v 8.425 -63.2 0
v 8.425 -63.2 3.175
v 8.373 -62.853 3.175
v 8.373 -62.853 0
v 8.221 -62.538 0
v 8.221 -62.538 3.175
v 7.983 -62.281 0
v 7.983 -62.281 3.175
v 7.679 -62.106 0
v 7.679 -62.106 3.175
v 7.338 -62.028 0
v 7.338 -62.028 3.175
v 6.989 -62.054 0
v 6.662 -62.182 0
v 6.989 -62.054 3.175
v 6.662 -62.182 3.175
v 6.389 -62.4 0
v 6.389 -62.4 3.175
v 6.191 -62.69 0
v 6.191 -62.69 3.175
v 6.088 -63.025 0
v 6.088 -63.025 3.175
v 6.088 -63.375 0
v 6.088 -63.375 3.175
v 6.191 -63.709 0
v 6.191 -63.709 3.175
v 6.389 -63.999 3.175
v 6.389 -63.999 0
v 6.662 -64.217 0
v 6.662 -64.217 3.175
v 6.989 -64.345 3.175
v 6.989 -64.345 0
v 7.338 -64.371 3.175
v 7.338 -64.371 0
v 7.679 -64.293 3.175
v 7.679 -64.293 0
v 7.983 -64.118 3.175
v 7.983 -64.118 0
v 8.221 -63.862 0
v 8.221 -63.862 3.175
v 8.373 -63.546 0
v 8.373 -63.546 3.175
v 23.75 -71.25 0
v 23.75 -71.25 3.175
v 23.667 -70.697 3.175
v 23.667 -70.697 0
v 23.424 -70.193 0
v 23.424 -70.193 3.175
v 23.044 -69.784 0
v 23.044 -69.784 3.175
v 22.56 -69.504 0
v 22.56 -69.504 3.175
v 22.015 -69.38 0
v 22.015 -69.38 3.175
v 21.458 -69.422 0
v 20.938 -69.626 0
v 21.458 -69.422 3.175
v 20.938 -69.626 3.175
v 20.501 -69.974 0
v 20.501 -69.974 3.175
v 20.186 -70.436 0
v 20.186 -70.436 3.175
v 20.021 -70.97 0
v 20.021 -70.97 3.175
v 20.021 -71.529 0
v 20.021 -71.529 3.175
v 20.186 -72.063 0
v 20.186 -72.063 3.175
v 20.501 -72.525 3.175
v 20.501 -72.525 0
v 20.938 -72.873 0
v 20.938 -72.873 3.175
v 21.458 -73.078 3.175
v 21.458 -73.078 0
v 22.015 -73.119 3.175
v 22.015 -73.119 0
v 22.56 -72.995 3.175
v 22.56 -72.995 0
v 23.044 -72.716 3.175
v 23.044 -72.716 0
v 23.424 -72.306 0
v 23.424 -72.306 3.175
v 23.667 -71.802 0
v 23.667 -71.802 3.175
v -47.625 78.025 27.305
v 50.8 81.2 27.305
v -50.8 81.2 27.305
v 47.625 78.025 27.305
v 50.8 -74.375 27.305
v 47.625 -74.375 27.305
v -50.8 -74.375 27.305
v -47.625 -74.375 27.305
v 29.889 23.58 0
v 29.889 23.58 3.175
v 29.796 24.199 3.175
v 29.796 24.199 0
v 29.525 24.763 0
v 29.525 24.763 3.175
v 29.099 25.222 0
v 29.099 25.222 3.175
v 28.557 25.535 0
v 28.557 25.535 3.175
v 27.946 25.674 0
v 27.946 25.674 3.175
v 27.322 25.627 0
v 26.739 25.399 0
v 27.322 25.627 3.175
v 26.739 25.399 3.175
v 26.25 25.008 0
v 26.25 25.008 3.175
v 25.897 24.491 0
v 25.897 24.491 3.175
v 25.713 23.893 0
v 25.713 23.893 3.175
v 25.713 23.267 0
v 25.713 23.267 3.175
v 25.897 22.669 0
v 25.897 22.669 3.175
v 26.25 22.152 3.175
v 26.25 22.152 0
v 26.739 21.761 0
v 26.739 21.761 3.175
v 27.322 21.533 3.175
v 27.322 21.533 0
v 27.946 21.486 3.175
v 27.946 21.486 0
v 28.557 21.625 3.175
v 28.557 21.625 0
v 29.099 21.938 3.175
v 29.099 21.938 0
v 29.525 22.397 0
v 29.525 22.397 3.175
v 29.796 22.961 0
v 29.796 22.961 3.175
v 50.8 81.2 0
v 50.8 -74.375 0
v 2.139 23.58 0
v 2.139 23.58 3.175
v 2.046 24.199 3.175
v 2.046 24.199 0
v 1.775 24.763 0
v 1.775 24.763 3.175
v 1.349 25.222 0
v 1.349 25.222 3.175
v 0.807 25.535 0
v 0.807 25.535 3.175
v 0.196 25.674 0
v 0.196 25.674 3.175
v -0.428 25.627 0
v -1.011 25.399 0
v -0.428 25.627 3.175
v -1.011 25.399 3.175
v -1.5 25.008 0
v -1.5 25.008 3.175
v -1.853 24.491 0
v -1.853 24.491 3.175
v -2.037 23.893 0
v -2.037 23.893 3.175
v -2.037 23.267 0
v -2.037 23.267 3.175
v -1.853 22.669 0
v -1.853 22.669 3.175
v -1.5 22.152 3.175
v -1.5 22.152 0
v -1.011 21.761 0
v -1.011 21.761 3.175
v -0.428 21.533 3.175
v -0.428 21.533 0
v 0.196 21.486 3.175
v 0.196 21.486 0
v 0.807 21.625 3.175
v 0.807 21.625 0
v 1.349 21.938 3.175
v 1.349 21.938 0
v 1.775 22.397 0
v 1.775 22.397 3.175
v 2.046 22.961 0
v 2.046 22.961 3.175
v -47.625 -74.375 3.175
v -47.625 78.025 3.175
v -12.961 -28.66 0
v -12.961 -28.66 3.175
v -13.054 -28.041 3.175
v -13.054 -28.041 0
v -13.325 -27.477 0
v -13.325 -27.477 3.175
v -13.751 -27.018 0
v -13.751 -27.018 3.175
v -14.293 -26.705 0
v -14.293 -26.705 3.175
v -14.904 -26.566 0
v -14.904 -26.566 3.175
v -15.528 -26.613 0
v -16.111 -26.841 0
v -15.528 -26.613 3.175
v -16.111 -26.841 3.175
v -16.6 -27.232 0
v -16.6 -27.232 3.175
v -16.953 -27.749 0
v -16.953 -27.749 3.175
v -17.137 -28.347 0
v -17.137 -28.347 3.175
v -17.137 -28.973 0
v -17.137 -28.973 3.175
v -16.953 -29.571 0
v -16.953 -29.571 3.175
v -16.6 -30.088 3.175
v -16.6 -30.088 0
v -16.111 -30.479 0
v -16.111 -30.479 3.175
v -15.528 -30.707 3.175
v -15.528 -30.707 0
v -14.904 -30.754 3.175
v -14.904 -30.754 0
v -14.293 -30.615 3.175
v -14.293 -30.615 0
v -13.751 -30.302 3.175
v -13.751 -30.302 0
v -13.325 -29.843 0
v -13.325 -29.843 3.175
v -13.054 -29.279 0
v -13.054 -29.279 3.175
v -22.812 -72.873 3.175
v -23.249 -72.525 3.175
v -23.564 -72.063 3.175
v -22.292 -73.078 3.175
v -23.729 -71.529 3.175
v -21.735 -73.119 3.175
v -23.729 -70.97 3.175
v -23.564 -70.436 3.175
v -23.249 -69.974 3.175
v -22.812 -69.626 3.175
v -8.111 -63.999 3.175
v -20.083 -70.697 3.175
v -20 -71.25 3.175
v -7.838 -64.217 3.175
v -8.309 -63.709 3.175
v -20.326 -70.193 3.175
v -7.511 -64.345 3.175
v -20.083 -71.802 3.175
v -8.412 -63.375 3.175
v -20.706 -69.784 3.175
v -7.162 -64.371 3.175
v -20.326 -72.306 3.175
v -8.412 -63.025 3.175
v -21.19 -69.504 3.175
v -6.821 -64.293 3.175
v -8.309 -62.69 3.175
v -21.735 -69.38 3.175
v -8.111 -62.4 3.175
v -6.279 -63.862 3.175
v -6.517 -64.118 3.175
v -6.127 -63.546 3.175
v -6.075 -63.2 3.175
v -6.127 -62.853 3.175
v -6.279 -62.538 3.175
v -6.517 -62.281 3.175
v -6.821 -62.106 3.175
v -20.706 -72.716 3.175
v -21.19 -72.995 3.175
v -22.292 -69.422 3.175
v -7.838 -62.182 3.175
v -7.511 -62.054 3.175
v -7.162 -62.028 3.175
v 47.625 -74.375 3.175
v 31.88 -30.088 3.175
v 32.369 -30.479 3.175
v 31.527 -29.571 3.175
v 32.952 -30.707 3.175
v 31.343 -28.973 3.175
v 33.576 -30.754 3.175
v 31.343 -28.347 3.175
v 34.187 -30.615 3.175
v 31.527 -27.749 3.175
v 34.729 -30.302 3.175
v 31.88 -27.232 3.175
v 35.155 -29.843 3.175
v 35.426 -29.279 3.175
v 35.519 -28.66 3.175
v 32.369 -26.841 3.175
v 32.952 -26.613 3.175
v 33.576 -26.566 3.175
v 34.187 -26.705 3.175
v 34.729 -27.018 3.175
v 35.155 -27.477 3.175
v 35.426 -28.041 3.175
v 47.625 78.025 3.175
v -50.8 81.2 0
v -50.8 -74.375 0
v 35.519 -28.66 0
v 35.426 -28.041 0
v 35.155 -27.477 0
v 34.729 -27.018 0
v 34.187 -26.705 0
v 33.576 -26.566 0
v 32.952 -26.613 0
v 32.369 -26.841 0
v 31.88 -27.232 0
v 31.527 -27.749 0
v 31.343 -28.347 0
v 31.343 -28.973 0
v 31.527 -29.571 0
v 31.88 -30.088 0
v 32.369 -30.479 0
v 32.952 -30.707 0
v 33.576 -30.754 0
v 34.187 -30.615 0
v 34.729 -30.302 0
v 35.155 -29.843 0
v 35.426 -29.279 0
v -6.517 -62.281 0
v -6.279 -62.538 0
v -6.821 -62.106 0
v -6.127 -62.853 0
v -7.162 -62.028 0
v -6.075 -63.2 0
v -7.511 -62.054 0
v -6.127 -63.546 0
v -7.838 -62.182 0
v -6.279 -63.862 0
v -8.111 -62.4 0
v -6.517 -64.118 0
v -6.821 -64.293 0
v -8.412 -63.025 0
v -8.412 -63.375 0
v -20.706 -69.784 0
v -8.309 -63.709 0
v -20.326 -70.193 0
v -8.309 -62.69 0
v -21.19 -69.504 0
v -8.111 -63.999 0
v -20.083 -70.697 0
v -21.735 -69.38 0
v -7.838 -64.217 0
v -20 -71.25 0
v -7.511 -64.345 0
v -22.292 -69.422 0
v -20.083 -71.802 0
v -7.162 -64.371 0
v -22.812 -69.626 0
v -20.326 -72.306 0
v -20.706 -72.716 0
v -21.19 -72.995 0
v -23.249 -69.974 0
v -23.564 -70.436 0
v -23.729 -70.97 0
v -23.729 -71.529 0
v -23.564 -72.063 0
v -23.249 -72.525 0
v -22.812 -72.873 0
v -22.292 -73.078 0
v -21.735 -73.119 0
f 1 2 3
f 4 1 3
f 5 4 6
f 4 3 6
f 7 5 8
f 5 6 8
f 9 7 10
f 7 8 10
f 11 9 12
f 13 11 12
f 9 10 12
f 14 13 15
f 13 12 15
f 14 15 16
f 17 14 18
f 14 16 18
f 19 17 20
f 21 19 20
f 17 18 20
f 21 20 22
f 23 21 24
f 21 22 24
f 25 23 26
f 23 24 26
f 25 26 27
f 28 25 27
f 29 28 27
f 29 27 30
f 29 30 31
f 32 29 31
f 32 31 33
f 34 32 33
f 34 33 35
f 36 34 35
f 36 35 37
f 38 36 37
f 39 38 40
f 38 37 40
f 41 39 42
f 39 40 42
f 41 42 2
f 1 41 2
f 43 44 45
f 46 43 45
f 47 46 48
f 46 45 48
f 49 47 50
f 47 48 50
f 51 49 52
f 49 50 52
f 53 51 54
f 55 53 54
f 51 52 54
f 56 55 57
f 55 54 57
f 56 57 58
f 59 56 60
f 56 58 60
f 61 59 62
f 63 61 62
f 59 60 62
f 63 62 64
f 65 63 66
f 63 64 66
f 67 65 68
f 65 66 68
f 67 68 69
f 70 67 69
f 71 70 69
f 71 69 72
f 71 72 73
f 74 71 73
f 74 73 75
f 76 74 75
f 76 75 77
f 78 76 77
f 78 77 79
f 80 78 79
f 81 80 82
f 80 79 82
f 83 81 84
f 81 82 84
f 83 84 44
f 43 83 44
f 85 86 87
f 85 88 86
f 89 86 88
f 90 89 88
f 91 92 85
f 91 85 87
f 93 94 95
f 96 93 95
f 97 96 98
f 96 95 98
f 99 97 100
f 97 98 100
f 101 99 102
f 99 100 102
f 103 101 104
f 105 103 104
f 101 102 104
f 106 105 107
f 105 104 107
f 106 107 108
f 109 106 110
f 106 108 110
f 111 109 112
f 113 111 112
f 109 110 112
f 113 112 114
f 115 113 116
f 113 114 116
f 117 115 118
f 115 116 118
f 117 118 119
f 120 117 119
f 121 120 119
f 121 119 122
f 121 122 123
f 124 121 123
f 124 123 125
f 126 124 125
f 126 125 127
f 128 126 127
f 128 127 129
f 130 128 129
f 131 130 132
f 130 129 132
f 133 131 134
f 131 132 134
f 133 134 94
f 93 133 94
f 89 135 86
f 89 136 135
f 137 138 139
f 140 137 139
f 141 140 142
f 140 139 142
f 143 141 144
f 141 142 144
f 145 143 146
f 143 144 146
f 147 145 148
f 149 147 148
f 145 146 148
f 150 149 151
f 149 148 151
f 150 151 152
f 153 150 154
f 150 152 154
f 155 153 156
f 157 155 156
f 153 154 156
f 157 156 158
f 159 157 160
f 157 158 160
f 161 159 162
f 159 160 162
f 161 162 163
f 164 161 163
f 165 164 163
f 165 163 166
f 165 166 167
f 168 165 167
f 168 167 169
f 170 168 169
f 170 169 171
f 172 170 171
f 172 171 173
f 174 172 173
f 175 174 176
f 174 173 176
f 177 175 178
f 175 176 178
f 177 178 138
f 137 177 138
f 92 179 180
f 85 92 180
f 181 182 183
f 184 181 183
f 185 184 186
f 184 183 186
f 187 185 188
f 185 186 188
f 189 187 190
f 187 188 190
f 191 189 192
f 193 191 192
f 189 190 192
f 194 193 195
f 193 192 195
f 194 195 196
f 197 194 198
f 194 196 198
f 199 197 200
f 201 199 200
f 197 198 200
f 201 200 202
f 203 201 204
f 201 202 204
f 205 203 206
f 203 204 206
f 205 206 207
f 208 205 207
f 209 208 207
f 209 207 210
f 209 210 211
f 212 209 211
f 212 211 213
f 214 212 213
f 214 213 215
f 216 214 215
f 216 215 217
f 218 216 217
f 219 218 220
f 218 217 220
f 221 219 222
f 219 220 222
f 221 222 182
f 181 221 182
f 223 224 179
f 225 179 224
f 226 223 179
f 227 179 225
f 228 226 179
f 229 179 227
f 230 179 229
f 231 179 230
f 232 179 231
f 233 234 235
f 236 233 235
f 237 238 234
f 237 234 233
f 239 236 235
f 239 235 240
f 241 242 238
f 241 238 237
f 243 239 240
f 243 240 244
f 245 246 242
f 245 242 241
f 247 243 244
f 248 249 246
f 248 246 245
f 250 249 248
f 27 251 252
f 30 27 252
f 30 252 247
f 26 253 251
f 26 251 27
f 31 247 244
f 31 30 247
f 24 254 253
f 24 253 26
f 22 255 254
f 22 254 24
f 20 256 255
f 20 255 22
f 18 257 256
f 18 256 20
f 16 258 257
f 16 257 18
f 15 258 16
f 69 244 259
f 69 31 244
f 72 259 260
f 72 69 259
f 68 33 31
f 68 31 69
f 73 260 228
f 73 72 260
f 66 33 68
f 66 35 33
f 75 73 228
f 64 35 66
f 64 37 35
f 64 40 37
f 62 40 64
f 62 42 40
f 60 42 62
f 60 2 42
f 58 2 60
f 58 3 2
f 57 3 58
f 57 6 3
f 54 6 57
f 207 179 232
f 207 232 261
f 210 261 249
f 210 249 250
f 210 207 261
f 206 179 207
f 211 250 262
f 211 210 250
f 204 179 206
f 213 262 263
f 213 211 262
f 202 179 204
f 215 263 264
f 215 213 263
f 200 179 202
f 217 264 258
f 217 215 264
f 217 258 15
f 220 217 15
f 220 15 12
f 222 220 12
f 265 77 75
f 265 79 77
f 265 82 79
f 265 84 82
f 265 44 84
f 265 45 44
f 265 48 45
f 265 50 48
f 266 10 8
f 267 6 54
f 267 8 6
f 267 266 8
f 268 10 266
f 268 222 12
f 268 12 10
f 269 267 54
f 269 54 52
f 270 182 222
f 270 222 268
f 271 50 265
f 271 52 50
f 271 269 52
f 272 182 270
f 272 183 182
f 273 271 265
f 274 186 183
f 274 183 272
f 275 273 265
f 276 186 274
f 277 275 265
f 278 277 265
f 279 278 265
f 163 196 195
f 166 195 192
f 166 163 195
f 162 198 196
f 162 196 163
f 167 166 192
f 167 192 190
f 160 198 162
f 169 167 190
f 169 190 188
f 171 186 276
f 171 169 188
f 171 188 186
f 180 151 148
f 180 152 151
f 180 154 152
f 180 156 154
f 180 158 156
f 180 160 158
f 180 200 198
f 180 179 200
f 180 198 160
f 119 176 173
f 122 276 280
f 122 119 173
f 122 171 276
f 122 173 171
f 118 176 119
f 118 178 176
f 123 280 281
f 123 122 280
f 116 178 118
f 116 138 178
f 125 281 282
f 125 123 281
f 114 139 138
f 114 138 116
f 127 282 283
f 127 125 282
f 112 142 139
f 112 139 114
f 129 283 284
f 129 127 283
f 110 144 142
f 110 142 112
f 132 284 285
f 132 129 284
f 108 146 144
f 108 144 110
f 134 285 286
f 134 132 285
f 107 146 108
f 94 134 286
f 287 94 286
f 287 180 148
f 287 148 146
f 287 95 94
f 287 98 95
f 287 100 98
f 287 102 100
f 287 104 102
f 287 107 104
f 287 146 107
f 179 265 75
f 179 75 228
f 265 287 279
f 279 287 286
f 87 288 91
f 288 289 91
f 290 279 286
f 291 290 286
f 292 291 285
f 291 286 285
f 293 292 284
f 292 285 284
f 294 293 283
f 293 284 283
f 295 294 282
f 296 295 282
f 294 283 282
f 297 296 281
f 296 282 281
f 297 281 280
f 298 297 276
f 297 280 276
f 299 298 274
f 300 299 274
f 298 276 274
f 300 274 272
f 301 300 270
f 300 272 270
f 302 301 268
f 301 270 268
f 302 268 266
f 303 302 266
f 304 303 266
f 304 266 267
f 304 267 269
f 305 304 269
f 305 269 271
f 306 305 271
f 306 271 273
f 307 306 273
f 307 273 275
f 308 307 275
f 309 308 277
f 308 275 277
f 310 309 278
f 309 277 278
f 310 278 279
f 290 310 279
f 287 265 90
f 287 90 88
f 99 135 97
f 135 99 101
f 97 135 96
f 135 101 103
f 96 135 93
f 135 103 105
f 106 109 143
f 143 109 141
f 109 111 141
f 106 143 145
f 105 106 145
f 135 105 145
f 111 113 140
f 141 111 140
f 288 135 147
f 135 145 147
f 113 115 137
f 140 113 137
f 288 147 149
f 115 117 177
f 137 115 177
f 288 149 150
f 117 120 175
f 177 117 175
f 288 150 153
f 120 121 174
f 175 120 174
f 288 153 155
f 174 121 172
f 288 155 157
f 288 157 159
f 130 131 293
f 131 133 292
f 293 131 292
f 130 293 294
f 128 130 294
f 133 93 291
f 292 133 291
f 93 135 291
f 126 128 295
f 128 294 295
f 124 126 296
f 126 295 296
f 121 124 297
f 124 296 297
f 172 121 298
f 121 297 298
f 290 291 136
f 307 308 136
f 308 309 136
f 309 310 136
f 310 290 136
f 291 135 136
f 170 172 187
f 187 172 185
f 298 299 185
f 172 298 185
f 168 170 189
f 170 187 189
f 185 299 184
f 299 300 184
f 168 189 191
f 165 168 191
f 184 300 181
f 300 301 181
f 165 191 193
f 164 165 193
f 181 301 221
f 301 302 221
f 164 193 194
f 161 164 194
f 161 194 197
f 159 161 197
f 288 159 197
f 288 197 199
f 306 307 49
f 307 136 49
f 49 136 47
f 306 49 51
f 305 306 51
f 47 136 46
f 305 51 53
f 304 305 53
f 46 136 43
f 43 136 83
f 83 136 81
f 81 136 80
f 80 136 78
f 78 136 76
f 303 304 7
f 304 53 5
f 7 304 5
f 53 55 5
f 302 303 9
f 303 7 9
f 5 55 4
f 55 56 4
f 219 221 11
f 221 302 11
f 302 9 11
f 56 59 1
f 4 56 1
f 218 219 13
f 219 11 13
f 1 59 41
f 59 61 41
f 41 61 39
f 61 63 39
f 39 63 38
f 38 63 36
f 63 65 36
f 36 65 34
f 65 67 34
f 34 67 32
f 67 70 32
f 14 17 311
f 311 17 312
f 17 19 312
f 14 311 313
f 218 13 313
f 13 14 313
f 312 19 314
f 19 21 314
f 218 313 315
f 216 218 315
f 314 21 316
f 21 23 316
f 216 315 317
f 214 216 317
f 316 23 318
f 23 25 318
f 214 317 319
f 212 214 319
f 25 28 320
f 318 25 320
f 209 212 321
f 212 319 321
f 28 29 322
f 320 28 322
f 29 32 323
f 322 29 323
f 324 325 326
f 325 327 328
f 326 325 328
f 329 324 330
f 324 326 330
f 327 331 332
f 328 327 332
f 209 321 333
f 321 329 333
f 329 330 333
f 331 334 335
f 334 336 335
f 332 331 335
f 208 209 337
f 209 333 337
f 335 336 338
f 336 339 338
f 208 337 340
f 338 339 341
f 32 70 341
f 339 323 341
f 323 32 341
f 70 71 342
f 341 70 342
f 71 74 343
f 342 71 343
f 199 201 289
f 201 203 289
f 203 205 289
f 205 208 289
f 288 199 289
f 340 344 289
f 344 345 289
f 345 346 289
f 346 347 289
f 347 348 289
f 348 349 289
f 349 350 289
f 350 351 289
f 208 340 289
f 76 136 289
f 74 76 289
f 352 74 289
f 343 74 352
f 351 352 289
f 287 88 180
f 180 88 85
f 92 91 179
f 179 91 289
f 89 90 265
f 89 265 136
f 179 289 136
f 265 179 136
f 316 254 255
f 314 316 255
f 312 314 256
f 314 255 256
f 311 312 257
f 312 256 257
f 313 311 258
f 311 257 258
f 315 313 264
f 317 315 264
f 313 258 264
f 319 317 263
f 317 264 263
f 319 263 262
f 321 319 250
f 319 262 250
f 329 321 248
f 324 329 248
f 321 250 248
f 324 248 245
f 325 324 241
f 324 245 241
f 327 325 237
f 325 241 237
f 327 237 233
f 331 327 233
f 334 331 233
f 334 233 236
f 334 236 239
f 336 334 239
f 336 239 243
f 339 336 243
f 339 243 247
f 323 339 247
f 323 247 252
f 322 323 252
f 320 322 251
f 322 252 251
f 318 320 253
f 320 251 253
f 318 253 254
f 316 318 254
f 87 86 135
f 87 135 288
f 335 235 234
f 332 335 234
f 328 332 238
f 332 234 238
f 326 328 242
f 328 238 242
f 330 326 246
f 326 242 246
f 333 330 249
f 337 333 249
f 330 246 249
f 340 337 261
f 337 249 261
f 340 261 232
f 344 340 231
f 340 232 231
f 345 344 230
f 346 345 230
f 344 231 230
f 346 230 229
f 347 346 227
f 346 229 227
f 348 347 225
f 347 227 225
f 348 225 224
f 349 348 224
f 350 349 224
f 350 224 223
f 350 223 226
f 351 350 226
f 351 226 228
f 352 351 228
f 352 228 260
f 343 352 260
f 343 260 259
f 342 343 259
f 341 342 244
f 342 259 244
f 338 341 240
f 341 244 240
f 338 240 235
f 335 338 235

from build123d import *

# Parameters (mm, degrees)
F0_W     = 101.6
F0_H     = 152.4
F1_DEPTH = 3.175
F2_W     = 3.175
F2_H     = 152.4
F3_DEPTH = 24.13
F4_W     = 101.6
F4_H     = 27.305
F5_DEPTH = 3.175
F6_R     = 1.875
F6_R_2   = 1.175
F6_R_3   = 2.1
F6_R_4   = 1.625
F7_DEPTH = 3.175


with BuildPart() as f1:
    # F0 (on Top) → F1 (new body)
    with BuildSketch(Plane.XY):
        with Locations((0, 1.825321)):
            Rectangle(F0_W, F0_H)
    extrude(amount=F1_DEPTH)

    # F2 (on face) → F3 (join)
    with BuildSketch(Plane.XY.offset(3.175)):
        with Locations((49.2125, 1.825321)):
            Rectangle(F2_W, F2_H)
        with Locations((-49.2125, 1.825321)):
            Rectangle(F2_W, F2_H)
    extrude(amount=F3_DEPTH)

    # F4 (on face) → F5 (join)
    with BuildSketch(Plane(origin=(0, 78.025321, 0), x_dir=(-1, 0, 0), z_dir=(0, 1, 0))):
        with Locations((0, 13.6525)):
            Rectangle(F4_W, F4_H)
    extrude(amount=F5_DEPTH)

    # F6 (on face) → F7 (cut, through all)
    with BuildSketch(Plane.XY.offset(3.175)):
        with Locations((-21.875, -71.249679)):
            Circle(F6_R)
        with Locations((21.875, -71.249679)):
            Circle(F6_R)
        with Locations((-7.25, -63.199679)):
            Circle(F6_R_2)
        with Locations((7.25, -63.199679)):
            Circle(F6_R_2)
        with Locations((-15.060561, -28.659923)):
            Circle(F6_R_3)
        with Locations((-15.060561, -28.659923)):
            Circle(F6_R_4, mode=Mode.SUBTRACT)
        with Locations((27.789439, 23.580077)):
            Circle(F6_R_3)
        with Locations((27.789439, 23.580077)):
            Circle(F6_R_4, mode=Mode.SUBTRACT)
        with Locations((0.039439, 23.580077)):
            Circle(F6_R_3)
        with Locations((0.039439, 23.580077)):
            Circle(F6_R_4, mode=Mode.SUBTRACT)
        with Locations((33.419439, -28.659923)):
            Circle(F6_R_3)
        with Locations((33.419439, -28.659923)):
            Circle(F6_R_4, mode=Mode.SUBTRACT)
        with Locations((27.789439, 23.580077)):
            Circle(F6_R_4)
        with Locations((33.419439, -28.659923)):
            Circle(F6_R_4)
        with Locations((-15.060561, -28.659923)):
            Circle(F6_R_4)
        with Locations((0.039439, 23.580077)):
            Circle(F6_R_4)
    extrude(amount=-F7_DEPTH, mode=Mode.SUBTRACT)


solid = f1.part
